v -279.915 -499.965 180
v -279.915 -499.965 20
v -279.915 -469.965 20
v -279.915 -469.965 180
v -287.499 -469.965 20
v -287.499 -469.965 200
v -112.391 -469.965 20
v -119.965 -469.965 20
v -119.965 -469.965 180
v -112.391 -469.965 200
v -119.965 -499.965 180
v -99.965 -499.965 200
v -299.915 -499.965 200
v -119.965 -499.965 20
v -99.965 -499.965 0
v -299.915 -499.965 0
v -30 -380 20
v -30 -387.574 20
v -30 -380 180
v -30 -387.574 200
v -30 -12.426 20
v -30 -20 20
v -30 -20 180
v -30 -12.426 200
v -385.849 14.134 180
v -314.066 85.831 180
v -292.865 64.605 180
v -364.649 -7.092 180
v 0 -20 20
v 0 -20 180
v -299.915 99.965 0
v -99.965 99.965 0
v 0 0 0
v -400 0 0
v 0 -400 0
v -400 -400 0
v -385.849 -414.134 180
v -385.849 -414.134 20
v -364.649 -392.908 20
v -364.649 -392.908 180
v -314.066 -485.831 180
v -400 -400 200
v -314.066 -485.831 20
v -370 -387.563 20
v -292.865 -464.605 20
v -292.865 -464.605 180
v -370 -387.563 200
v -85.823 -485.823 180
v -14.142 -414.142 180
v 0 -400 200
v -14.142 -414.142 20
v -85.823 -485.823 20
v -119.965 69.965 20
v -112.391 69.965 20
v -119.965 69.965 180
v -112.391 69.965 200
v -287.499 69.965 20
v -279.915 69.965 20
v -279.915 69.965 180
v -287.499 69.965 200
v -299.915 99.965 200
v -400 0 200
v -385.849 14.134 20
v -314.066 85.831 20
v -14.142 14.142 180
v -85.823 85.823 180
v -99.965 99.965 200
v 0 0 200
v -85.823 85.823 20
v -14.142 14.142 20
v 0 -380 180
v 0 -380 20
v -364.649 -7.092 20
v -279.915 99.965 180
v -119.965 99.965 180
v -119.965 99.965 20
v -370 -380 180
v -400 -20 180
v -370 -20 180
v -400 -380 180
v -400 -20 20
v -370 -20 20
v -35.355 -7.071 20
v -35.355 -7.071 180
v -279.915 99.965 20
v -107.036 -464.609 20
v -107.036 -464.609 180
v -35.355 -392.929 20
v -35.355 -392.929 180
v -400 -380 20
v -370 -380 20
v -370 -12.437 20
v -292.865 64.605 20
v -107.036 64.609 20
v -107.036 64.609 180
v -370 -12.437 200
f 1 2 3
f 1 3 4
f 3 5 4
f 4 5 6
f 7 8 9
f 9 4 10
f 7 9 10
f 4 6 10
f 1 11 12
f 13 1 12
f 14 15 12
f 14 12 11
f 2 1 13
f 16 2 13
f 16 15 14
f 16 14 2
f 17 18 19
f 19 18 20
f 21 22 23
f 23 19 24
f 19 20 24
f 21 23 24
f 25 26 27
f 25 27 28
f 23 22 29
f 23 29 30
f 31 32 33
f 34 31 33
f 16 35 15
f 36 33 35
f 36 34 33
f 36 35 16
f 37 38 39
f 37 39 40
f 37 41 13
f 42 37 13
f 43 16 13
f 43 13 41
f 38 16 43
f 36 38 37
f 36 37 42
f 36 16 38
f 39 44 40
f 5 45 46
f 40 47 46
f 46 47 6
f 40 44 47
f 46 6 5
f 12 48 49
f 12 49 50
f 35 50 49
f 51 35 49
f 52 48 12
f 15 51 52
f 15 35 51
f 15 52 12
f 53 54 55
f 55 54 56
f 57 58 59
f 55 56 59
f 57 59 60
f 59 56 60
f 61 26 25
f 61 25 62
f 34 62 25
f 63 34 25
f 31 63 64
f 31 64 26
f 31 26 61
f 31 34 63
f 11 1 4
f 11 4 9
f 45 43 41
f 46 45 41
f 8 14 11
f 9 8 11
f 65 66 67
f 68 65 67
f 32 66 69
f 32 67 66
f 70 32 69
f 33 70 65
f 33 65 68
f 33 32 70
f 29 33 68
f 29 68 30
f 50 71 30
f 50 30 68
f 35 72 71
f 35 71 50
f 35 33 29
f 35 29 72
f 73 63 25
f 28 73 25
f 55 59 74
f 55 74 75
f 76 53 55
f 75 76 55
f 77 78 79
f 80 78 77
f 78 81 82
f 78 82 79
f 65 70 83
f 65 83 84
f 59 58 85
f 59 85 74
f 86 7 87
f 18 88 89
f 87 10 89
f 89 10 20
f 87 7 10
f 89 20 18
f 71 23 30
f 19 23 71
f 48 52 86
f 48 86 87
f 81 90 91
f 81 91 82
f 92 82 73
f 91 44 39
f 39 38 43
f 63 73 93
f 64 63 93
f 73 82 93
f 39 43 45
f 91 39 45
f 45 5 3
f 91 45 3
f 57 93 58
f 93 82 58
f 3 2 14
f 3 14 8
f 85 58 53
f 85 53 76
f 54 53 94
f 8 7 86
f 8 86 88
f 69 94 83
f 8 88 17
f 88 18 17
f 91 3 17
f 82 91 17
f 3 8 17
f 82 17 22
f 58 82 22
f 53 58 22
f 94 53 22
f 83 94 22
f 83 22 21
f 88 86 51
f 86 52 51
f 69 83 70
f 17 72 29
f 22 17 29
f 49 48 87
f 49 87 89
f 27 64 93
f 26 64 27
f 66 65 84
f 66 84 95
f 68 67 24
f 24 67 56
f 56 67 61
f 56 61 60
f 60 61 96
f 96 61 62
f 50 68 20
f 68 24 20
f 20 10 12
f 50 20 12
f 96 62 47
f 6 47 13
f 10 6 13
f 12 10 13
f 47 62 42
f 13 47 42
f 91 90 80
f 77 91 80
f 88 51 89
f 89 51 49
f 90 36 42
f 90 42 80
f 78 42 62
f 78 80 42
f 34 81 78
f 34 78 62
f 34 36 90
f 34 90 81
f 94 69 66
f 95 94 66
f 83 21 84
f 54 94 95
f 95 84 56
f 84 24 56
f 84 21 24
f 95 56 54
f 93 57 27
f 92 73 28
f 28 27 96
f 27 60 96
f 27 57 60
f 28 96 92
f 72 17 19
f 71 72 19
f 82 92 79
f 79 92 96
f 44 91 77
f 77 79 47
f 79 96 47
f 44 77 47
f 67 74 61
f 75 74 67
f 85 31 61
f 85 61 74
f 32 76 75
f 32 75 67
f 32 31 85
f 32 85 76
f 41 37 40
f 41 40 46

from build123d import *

# Parameters (mm, degrees)
BOSS_EXTRUDE1_DEPTH = 200
CUT_EXTRUDE1_DEPTH  = 180
SKETCH6_W           = 360
SKETCH6_H           = 160
CUT_EXTRUDE2_DEPTH  = 671.794129466
SKETCH7_W           = 101.456658586
SKETCH7_H           = 160
CUT_EXTRUDE3_DEPTH  = 30
SKETCH8_W           = 101.456658586
SKETCH8_H           = 160
CUT_EXTRUDE4_DEPTH  = 30
SKETCH9_W           = 101.37152343
SKETCH9_H           = 160
CUT_EXTRUDE5_DEPTH  = 30
SKETCH10_W          = 101.371523429
SKETCH10_H          = 160
CUT_EXTRUDE6_DEPTH  = 30
SKETCH11_W          = 159.950111148
SKETCH11_H          = 160
CUT_EXTRUDE7_DEPTH  = 749.274973447


with BuildPart() as part:
    # Sketch1 → Boss-Extrude1 (new body)
    with BuildSketch(Plane(origin=(0, 0, 0), x_dir=(0, 1, 0), z_dir=(0, 0, 1))):
        Polygon((-400, 0), (-499.964762884, 99.964762884), (-499.964762884, 299.914874032), (-400, 400), (0, 400), (99.964762884, 299.914874032), (99.964762884, 99.964762884), (0, 0), align=None)
    extrude(amount=BOSS_EXTRUDE1_DEPTH)

    # Sketch4 → Cut-Extrude1 (cut)
    with BuildSketch(Plane.XY.offset(200)):
        Polygon((-30, -387.573593129), (-30, -12.426406871), (-112.391169755, 69.964762884), (-287.499039265, 69.964762884), (-370, -12.43698161), (-370, -387.56301839), (-287.499039265, -469.964762884), (-112.391169755, -469.964762884), align=None)
    extrude(amount=-CUT_EXTRUDE1_DEPTH, mode=Mode.SUBTRACT)

    # Sketch6 → Cut-Extrude2 (cut, through all)
    with BuildSketch(Plane(origin=(-400, 0, 0), x_dir=(0, -1, 0), z_dir=(-1, 0, 0))):
        with Locations((200, 100)):
            Rectangle(SKETCH6_W, SKETCH6_H)
    extrude(amount=-CUT_EXTRUDE2_DEPTH, mode=Mode.SUBTRACT)

    # Sketch7 → Cut-Extrude3 (cut)
    with BuildSketch(Plane(origin=(-199.759333952, 199.9998552, 0), x_dir=(-0.7075320947633997, -0.7066812116362764, 0), z_dir=(-0.7066812116362764, 0.7075320947633997, 0))):
        with Locations((212.284508612, 100)):
            Rectangle(SKETCH7_W, SKETCH7_H)
    extrude(amount=-CUT_EXTRUDE3_DEPTH, mode=Mode.SUBTRACT)

    # Sketch8 → Cut-Extrude4 (cut)
    with BuildSketch(Plane(origin=(-399.759189151, -400.240521248, 0), x_dir=(0.7075320947633943, -0.7066812116362818, 0), z_dir=(-0.7066812116362818, -0.7075320947633943, 0))):
        with Locations((70.387976042, 100)):
            Rectangle(SKETCH8_W, SKETCH8_H)
    extrude(amount=-CUT_EXTRUDE4_DEPTH, mode=Mode.SUBTRACT)

    # Sketch9 → Cut-Extrude5 (cut)
    with BuildSketch(Plane(origin=(0, 0, 0), x_dir=(-0.7071067811865487, 0.7071067811865465, 0), z_dir=(0.7071067811865465, 0.7071067811865487, 0))):
        with Locations((70.685761715, 100)):
            Rectangle(SKETCH9_W, SKETCH9_H)
    extrude(amount=-CUT_EXTRUDE5_DEPTH, mode=Mode.SUBTRACT)

    # Sketch10 → Cut-Extrude6 (cut)
    with BuildSketch(Plane(origin=(200, -200, 0), x_dir=(0.7071067811865439, 0.7071067811865511, 0), z_dir=(0.7071067811865511, -0.7071067811865439, 0))):
        with Locations((-353.52847419, 100)):
            Rectangle(SKETCH10_W, SKETCH10_H)
    extrude(amount=-CUT_EXTRUDE6_DEPTH, mode=Mode.SUBTRACT)

    # Sketch11 → Cut-Extrude7 (cut, through all)
    with BuildSketch(Plane.XZ.offset(499.964762884)):
        with Locations((-199.939818458, 100)):
            Rectangle(SKETCH11_W, SKETCH11_H)
    extrude(amount=-CUT_EXTRUDE7_DEPTH, mode=Mode.SUBTRACT)


solid = part.part
